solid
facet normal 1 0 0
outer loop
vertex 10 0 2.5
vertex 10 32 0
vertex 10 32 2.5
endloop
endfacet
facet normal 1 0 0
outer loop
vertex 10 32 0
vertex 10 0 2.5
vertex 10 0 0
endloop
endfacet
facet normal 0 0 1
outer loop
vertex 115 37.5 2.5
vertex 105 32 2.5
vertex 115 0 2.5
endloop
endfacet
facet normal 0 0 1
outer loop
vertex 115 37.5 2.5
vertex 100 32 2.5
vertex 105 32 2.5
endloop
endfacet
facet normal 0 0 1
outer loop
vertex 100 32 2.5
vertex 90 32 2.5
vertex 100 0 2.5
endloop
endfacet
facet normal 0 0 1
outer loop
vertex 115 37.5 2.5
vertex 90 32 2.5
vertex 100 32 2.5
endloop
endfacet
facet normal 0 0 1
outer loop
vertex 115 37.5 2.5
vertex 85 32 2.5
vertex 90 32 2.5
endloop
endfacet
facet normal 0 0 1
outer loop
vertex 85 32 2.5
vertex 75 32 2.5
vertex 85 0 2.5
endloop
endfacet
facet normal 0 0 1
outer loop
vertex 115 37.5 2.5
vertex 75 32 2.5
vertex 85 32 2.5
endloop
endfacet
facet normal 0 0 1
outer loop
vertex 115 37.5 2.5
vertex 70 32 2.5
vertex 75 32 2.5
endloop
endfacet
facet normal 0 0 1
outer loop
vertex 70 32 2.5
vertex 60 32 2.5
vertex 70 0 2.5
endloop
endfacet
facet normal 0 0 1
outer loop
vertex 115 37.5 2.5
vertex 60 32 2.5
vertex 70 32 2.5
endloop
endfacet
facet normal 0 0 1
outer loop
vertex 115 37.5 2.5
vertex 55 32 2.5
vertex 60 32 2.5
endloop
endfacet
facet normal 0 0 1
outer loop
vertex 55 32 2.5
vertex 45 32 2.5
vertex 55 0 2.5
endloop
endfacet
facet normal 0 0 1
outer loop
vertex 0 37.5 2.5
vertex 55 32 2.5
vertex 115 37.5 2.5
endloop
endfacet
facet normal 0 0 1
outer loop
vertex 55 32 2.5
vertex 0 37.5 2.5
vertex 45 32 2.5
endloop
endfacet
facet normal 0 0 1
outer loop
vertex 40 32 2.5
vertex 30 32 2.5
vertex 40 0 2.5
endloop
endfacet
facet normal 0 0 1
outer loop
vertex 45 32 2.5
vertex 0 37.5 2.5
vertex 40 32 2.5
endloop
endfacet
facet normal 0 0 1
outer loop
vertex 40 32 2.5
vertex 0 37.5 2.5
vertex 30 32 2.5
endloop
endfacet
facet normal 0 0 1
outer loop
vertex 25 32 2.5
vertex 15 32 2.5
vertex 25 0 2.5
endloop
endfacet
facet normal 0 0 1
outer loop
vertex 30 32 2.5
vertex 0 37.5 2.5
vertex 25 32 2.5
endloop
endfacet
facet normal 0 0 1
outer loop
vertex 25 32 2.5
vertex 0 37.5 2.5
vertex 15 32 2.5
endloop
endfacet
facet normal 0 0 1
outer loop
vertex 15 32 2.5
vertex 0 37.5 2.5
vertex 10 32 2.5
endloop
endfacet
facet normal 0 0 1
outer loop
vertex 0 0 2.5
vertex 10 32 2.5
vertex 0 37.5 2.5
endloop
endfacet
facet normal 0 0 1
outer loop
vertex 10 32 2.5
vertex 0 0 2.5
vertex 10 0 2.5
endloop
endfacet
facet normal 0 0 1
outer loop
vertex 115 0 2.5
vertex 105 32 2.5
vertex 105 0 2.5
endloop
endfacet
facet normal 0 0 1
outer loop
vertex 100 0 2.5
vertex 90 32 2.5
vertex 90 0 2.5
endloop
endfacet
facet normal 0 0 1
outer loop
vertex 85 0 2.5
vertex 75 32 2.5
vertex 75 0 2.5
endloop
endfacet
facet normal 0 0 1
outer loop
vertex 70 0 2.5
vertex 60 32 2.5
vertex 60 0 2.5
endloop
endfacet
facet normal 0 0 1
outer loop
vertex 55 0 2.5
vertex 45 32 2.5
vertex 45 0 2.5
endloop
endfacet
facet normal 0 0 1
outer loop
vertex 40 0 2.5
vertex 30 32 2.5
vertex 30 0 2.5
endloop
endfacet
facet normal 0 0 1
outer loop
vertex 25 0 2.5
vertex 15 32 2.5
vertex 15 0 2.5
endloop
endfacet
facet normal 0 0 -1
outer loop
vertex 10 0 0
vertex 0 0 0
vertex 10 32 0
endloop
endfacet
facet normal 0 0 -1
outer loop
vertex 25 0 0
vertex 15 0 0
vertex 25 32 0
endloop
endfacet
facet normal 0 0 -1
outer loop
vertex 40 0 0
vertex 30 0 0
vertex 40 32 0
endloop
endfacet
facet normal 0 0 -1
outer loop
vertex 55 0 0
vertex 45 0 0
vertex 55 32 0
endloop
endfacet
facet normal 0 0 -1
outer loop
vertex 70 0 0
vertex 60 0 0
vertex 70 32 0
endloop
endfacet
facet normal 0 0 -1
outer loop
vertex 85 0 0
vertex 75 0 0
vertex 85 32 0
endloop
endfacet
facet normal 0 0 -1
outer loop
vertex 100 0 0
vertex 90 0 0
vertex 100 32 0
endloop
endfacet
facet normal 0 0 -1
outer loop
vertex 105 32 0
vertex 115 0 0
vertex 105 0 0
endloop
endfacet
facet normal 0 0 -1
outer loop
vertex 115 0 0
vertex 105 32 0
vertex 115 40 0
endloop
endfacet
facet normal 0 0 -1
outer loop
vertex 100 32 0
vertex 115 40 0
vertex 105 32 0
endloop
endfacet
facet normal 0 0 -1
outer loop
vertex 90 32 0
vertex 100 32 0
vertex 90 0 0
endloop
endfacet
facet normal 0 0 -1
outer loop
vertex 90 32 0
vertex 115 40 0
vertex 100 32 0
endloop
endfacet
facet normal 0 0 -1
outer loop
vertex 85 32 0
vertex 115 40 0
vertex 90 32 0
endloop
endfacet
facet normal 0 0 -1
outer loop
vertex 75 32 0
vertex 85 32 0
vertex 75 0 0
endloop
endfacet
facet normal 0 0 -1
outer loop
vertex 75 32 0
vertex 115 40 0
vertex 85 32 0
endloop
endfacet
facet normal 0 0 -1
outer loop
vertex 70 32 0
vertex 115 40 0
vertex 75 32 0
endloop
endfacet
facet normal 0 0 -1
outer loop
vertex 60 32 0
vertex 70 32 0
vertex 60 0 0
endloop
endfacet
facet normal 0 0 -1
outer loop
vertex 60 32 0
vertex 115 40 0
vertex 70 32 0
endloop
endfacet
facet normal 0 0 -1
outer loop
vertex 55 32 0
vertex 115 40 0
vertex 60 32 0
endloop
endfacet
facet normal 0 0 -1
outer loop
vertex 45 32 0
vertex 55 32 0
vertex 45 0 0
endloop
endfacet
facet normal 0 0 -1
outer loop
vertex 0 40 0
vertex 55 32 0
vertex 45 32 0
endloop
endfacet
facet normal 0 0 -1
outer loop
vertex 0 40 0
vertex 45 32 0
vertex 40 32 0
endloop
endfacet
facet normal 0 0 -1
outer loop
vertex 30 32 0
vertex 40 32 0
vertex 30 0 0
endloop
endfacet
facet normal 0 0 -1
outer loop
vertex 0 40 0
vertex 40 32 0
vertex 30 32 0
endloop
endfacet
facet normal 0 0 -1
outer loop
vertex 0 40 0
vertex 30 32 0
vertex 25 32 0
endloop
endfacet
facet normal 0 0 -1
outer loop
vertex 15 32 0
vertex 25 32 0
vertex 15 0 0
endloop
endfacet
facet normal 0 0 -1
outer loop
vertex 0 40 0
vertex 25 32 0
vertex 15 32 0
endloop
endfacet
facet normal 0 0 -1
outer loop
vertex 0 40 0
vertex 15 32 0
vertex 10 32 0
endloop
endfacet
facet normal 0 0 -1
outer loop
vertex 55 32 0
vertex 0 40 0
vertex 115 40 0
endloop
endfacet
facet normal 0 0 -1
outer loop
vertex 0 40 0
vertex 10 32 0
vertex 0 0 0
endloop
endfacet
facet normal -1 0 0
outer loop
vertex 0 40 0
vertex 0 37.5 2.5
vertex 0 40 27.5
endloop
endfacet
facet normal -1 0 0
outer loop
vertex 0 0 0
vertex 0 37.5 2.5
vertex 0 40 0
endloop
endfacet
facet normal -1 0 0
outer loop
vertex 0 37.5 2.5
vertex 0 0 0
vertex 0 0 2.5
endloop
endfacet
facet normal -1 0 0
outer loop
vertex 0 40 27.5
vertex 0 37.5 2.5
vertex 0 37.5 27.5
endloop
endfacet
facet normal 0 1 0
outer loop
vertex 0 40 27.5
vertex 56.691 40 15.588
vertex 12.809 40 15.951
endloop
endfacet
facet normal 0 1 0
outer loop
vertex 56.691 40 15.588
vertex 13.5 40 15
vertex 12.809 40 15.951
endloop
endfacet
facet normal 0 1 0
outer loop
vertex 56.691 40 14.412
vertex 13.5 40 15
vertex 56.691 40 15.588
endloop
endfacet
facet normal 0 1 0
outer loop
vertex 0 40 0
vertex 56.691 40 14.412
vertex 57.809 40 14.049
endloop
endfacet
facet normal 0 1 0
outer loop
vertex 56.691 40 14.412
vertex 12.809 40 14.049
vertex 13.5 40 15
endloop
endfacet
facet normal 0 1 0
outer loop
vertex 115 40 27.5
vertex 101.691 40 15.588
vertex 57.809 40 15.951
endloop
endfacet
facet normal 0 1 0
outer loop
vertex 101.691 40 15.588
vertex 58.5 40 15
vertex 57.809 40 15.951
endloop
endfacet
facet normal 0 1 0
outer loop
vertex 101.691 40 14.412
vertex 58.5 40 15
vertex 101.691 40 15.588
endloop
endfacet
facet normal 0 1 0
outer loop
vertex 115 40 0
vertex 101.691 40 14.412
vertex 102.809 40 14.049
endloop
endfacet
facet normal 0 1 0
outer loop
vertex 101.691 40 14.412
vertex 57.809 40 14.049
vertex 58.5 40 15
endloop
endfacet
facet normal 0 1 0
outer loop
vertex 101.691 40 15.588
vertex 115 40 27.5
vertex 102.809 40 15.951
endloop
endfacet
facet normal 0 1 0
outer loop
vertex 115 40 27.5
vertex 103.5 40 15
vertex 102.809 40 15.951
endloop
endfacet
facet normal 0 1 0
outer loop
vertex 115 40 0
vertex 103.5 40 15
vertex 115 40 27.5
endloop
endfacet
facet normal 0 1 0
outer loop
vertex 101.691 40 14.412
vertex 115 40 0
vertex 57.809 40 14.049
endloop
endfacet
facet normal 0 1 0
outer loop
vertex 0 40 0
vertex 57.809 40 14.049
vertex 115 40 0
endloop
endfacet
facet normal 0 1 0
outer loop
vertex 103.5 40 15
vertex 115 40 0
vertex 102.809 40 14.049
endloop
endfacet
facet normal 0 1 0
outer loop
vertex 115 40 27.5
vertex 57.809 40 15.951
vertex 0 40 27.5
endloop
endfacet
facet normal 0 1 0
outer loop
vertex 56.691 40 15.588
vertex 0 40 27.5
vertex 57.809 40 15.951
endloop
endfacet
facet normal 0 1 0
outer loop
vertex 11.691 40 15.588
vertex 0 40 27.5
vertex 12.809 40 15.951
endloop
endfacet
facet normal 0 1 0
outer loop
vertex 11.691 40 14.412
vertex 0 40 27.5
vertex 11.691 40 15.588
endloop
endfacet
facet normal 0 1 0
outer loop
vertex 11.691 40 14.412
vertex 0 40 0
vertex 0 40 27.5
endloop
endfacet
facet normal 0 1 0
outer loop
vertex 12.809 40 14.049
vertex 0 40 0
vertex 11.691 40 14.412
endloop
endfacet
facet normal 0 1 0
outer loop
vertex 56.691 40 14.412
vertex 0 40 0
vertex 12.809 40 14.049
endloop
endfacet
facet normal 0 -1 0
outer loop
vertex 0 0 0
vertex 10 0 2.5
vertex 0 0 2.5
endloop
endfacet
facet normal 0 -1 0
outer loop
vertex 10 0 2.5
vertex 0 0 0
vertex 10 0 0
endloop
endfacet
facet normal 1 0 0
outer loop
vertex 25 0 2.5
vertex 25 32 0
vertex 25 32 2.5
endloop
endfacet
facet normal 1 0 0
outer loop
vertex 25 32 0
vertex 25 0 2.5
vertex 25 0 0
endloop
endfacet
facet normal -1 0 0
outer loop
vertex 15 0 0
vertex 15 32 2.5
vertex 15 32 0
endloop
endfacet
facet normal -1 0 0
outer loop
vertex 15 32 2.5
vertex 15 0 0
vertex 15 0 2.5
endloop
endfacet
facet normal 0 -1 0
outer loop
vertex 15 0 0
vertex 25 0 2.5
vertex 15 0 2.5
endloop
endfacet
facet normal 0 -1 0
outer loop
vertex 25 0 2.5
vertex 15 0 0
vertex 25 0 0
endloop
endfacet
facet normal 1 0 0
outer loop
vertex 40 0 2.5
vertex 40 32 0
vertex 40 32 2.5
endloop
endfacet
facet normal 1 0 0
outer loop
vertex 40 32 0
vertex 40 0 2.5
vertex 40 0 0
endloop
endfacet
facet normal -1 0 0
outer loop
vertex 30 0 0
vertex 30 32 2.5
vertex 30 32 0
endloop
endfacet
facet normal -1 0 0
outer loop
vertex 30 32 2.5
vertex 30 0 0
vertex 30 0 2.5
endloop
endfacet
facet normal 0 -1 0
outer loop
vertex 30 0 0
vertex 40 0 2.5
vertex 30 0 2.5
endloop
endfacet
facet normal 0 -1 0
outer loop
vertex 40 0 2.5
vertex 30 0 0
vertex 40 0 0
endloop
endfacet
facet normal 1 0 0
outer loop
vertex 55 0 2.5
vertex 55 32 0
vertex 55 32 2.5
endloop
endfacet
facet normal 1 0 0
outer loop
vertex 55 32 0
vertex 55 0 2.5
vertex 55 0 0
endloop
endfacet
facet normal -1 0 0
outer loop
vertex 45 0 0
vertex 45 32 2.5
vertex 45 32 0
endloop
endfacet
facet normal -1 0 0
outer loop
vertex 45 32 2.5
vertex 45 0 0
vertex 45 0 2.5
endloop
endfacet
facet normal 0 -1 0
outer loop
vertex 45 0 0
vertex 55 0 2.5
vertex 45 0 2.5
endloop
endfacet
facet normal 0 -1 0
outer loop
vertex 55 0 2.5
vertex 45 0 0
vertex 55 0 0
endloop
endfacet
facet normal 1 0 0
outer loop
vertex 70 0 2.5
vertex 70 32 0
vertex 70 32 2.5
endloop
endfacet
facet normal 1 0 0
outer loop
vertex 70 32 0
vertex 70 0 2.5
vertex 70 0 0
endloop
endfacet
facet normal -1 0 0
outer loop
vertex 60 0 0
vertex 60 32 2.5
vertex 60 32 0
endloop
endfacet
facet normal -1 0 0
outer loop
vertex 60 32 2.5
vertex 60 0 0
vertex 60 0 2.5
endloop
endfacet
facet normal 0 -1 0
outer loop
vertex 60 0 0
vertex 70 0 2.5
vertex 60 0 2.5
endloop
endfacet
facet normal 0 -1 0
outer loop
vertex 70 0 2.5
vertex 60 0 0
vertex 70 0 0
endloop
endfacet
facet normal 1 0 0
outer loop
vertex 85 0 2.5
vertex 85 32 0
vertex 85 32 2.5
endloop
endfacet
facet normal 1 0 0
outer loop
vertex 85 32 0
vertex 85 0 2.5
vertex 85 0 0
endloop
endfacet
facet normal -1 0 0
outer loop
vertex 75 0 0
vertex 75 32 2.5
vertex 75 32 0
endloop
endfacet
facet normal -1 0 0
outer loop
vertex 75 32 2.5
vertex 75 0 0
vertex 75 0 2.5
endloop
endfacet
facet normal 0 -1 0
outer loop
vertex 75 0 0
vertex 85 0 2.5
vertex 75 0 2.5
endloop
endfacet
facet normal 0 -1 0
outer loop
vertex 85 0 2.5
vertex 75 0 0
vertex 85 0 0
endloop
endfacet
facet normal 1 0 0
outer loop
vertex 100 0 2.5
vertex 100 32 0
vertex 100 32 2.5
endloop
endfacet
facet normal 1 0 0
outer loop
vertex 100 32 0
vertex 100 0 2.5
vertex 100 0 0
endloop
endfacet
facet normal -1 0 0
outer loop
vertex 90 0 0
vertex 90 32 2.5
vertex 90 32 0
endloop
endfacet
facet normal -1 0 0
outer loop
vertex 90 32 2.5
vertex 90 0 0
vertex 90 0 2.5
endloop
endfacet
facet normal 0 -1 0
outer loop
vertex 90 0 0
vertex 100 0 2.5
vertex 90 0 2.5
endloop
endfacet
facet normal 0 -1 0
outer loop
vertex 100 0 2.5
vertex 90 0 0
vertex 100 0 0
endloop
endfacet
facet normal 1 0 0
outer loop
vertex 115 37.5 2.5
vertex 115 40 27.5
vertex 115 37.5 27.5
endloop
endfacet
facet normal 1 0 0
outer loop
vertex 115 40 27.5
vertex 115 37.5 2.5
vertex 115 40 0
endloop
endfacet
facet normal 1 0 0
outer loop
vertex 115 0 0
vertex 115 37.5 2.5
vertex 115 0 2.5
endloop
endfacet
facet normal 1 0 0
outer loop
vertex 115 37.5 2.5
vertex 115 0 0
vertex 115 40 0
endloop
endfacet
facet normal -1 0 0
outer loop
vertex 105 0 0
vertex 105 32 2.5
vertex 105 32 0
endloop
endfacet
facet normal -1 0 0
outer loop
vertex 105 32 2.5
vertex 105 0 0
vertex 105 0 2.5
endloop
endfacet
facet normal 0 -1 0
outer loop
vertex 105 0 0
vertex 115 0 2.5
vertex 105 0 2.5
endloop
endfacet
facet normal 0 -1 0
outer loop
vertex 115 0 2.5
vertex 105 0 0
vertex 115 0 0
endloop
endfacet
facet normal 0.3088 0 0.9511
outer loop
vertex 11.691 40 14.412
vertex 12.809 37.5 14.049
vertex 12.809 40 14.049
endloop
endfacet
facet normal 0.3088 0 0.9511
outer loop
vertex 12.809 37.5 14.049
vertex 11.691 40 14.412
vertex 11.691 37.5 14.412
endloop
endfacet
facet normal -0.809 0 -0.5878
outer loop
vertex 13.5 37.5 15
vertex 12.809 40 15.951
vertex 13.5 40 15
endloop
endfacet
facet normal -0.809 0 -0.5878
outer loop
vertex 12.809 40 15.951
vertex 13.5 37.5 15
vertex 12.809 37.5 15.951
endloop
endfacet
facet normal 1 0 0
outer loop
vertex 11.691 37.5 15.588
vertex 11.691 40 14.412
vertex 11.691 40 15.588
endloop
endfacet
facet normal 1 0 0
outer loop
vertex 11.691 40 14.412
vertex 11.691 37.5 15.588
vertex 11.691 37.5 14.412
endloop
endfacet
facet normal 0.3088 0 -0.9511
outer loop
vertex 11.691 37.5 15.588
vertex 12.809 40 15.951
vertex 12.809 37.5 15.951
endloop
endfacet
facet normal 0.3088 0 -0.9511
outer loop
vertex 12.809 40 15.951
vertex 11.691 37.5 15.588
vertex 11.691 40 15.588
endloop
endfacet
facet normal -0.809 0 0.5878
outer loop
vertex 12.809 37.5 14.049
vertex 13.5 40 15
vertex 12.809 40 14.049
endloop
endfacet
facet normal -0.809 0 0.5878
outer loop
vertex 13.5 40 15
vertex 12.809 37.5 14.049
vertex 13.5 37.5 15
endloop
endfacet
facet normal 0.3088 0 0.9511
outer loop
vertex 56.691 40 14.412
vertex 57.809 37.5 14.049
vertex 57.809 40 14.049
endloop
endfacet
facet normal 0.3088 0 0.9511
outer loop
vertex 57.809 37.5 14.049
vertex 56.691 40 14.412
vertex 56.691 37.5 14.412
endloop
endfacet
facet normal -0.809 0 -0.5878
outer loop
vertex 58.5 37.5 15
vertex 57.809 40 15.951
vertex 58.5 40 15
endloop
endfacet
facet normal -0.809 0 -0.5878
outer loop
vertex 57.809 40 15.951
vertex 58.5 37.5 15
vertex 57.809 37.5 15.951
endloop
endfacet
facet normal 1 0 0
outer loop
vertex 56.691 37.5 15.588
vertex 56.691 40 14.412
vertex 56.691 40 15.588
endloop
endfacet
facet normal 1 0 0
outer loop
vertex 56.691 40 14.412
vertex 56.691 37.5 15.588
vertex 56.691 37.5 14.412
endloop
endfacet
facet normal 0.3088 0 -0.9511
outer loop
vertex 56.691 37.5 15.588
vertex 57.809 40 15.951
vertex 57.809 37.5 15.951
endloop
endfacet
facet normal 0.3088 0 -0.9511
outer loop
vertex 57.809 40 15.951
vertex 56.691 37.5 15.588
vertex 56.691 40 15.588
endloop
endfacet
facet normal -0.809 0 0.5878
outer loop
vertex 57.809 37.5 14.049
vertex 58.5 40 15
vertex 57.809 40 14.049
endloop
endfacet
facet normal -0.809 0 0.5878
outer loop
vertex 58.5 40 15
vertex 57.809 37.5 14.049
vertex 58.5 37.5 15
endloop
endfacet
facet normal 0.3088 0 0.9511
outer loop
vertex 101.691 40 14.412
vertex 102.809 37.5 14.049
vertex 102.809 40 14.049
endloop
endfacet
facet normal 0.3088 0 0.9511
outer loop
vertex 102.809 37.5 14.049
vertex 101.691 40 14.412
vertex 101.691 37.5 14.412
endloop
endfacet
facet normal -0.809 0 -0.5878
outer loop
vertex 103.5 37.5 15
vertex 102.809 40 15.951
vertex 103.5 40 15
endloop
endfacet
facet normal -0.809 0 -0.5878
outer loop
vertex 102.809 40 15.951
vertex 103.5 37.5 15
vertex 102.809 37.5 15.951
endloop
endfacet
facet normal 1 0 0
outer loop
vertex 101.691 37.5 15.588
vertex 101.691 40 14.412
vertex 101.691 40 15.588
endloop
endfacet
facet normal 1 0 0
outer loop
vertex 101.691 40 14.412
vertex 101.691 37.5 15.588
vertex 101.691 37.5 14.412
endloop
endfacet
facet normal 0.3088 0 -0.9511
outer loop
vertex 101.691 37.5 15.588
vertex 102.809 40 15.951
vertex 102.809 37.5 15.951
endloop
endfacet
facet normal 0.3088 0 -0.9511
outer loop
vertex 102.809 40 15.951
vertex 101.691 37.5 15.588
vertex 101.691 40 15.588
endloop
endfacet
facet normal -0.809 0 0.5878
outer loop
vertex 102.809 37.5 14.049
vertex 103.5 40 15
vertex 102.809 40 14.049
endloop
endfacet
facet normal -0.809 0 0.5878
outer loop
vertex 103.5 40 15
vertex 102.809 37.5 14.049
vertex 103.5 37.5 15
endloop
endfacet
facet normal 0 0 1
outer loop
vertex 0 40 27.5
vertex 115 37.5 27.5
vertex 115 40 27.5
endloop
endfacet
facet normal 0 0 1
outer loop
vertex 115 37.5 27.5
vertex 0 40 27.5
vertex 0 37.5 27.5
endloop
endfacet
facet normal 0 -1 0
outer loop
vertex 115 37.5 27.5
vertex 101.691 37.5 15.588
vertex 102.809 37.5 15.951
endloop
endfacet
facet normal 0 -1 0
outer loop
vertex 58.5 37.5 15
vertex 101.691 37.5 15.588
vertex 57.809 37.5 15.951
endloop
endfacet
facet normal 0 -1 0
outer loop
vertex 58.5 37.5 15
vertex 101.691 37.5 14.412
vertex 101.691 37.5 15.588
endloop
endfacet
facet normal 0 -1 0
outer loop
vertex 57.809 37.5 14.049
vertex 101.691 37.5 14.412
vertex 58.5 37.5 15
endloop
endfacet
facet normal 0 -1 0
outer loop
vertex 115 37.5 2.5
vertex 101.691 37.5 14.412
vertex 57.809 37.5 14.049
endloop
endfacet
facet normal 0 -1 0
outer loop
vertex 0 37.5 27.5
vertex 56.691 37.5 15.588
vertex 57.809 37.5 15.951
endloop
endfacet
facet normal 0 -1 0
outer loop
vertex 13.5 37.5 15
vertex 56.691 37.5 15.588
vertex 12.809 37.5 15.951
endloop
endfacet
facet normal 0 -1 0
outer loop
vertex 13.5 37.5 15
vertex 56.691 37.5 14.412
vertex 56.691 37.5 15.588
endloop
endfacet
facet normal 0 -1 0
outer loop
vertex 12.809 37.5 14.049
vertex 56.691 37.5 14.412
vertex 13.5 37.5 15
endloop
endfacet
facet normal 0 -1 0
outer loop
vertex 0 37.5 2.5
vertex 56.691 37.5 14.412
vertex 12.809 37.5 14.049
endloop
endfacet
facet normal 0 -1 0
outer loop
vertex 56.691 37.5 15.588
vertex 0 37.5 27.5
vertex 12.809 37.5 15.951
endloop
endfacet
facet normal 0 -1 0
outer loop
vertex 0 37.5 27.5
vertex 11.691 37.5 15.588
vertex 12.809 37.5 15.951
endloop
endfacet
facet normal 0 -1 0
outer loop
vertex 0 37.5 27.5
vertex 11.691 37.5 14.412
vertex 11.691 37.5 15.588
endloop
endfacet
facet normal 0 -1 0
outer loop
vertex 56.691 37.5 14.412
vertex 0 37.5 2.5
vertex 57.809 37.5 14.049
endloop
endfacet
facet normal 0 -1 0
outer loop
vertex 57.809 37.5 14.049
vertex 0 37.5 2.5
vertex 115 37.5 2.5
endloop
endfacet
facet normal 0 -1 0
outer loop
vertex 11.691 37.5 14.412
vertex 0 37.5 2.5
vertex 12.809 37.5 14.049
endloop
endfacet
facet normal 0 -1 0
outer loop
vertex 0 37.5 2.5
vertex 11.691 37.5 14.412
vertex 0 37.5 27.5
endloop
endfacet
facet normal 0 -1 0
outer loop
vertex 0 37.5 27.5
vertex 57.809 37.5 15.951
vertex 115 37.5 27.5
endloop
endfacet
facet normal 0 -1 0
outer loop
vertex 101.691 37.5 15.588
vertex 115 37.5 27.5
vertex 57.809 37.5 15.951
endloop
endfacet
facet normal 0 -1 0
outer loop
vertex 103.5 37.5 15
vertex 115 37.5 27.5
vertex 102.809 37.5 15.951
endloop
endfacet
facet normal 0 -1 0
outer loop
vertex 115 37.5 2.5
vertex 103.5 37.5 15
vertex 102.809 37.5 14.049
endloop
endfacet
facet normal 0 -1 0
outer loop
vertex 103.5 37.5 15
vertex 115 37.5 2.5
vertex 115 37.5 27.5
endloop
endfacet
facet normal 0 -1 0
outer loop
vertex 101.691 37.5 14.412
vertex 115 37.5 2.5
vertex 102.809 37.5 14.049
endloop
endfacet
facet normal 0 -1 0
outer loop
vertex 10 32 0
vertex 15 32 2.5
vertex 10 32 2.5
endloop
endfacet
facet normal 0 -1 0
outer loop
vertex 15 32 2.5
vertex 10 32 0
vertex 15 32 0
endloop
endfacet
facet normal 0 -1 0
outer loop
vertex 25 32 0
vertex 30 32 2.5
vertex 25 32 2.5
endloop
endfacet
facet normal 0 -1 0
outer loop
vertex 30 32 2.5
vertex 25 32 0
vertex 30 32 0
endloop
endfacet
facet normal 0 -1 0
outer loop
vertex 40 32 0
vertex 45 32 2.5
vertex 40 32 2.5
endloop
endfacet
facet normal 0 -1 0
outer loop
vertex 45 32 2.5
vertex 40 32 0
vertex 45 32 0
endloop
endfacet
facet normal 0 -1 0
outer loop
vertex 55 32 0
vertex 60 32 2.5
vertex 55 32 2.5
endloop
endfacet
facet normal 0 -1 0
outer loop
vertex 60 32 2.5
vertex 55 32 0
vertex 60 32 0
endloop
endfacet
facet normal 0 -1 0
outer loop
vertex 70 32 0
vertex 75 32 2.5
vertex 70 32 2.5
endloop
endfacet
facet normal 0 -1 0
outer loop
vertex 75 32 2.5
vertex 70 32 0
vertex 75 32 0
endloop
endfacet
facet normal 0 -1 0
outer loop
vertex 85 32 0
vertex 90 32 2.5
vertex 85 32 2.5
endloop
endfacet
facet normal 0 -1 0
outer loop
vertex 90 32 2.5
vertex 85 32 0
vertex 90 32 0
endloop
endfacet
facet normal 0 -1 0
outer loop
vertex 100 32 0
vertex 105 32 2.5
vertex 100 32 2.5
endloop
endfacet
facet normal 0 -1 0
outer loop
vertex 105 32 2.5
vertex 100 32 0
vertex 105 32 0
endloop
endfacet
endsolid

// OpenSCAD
// user-defined specifications:
slots = 7;
slot_width = 5;
tong_width = 10;
base_depth = 40;
back_height = 25;
thickness = 2.5;
num_holes = 3;
hole_radius = 1;

// calculated specs:
width = (slots * slot_width) + ((slots + 1) * tong_width);
hole_offset = tong_width + (slot_width / 2);
hole_space = (width - 2 * hole_offset) / (num_holes - 1);

// build part
union() {
  // place tongs
  for (i = [0:slots]) {
    translate([i * (tong_width + slot_width), 0, 0])
    cube([tong_width, base_depth, thickness]);
  }

  // tong, back panel intersection
  translate([0, 0.8 * base_depth, 0])
  cube([width, 0.2 * base_depth, thickness]);

  // place back panel with holes
  difference() {
    translate([0, base_depth - thickness, 0])
    cube([width, thickness, back_height + thickness]);
  
    for (i = [1:num_holes]) {
      translate([((i - 1) * hole_space) + hole_offset, base_depth - thickness / 2, (back_height / 2) + thickness])
      rotate([90, 0, 0])
      cylinder(h = thickness * 4, r = hole_radius, center = true);
    }
  }
}
